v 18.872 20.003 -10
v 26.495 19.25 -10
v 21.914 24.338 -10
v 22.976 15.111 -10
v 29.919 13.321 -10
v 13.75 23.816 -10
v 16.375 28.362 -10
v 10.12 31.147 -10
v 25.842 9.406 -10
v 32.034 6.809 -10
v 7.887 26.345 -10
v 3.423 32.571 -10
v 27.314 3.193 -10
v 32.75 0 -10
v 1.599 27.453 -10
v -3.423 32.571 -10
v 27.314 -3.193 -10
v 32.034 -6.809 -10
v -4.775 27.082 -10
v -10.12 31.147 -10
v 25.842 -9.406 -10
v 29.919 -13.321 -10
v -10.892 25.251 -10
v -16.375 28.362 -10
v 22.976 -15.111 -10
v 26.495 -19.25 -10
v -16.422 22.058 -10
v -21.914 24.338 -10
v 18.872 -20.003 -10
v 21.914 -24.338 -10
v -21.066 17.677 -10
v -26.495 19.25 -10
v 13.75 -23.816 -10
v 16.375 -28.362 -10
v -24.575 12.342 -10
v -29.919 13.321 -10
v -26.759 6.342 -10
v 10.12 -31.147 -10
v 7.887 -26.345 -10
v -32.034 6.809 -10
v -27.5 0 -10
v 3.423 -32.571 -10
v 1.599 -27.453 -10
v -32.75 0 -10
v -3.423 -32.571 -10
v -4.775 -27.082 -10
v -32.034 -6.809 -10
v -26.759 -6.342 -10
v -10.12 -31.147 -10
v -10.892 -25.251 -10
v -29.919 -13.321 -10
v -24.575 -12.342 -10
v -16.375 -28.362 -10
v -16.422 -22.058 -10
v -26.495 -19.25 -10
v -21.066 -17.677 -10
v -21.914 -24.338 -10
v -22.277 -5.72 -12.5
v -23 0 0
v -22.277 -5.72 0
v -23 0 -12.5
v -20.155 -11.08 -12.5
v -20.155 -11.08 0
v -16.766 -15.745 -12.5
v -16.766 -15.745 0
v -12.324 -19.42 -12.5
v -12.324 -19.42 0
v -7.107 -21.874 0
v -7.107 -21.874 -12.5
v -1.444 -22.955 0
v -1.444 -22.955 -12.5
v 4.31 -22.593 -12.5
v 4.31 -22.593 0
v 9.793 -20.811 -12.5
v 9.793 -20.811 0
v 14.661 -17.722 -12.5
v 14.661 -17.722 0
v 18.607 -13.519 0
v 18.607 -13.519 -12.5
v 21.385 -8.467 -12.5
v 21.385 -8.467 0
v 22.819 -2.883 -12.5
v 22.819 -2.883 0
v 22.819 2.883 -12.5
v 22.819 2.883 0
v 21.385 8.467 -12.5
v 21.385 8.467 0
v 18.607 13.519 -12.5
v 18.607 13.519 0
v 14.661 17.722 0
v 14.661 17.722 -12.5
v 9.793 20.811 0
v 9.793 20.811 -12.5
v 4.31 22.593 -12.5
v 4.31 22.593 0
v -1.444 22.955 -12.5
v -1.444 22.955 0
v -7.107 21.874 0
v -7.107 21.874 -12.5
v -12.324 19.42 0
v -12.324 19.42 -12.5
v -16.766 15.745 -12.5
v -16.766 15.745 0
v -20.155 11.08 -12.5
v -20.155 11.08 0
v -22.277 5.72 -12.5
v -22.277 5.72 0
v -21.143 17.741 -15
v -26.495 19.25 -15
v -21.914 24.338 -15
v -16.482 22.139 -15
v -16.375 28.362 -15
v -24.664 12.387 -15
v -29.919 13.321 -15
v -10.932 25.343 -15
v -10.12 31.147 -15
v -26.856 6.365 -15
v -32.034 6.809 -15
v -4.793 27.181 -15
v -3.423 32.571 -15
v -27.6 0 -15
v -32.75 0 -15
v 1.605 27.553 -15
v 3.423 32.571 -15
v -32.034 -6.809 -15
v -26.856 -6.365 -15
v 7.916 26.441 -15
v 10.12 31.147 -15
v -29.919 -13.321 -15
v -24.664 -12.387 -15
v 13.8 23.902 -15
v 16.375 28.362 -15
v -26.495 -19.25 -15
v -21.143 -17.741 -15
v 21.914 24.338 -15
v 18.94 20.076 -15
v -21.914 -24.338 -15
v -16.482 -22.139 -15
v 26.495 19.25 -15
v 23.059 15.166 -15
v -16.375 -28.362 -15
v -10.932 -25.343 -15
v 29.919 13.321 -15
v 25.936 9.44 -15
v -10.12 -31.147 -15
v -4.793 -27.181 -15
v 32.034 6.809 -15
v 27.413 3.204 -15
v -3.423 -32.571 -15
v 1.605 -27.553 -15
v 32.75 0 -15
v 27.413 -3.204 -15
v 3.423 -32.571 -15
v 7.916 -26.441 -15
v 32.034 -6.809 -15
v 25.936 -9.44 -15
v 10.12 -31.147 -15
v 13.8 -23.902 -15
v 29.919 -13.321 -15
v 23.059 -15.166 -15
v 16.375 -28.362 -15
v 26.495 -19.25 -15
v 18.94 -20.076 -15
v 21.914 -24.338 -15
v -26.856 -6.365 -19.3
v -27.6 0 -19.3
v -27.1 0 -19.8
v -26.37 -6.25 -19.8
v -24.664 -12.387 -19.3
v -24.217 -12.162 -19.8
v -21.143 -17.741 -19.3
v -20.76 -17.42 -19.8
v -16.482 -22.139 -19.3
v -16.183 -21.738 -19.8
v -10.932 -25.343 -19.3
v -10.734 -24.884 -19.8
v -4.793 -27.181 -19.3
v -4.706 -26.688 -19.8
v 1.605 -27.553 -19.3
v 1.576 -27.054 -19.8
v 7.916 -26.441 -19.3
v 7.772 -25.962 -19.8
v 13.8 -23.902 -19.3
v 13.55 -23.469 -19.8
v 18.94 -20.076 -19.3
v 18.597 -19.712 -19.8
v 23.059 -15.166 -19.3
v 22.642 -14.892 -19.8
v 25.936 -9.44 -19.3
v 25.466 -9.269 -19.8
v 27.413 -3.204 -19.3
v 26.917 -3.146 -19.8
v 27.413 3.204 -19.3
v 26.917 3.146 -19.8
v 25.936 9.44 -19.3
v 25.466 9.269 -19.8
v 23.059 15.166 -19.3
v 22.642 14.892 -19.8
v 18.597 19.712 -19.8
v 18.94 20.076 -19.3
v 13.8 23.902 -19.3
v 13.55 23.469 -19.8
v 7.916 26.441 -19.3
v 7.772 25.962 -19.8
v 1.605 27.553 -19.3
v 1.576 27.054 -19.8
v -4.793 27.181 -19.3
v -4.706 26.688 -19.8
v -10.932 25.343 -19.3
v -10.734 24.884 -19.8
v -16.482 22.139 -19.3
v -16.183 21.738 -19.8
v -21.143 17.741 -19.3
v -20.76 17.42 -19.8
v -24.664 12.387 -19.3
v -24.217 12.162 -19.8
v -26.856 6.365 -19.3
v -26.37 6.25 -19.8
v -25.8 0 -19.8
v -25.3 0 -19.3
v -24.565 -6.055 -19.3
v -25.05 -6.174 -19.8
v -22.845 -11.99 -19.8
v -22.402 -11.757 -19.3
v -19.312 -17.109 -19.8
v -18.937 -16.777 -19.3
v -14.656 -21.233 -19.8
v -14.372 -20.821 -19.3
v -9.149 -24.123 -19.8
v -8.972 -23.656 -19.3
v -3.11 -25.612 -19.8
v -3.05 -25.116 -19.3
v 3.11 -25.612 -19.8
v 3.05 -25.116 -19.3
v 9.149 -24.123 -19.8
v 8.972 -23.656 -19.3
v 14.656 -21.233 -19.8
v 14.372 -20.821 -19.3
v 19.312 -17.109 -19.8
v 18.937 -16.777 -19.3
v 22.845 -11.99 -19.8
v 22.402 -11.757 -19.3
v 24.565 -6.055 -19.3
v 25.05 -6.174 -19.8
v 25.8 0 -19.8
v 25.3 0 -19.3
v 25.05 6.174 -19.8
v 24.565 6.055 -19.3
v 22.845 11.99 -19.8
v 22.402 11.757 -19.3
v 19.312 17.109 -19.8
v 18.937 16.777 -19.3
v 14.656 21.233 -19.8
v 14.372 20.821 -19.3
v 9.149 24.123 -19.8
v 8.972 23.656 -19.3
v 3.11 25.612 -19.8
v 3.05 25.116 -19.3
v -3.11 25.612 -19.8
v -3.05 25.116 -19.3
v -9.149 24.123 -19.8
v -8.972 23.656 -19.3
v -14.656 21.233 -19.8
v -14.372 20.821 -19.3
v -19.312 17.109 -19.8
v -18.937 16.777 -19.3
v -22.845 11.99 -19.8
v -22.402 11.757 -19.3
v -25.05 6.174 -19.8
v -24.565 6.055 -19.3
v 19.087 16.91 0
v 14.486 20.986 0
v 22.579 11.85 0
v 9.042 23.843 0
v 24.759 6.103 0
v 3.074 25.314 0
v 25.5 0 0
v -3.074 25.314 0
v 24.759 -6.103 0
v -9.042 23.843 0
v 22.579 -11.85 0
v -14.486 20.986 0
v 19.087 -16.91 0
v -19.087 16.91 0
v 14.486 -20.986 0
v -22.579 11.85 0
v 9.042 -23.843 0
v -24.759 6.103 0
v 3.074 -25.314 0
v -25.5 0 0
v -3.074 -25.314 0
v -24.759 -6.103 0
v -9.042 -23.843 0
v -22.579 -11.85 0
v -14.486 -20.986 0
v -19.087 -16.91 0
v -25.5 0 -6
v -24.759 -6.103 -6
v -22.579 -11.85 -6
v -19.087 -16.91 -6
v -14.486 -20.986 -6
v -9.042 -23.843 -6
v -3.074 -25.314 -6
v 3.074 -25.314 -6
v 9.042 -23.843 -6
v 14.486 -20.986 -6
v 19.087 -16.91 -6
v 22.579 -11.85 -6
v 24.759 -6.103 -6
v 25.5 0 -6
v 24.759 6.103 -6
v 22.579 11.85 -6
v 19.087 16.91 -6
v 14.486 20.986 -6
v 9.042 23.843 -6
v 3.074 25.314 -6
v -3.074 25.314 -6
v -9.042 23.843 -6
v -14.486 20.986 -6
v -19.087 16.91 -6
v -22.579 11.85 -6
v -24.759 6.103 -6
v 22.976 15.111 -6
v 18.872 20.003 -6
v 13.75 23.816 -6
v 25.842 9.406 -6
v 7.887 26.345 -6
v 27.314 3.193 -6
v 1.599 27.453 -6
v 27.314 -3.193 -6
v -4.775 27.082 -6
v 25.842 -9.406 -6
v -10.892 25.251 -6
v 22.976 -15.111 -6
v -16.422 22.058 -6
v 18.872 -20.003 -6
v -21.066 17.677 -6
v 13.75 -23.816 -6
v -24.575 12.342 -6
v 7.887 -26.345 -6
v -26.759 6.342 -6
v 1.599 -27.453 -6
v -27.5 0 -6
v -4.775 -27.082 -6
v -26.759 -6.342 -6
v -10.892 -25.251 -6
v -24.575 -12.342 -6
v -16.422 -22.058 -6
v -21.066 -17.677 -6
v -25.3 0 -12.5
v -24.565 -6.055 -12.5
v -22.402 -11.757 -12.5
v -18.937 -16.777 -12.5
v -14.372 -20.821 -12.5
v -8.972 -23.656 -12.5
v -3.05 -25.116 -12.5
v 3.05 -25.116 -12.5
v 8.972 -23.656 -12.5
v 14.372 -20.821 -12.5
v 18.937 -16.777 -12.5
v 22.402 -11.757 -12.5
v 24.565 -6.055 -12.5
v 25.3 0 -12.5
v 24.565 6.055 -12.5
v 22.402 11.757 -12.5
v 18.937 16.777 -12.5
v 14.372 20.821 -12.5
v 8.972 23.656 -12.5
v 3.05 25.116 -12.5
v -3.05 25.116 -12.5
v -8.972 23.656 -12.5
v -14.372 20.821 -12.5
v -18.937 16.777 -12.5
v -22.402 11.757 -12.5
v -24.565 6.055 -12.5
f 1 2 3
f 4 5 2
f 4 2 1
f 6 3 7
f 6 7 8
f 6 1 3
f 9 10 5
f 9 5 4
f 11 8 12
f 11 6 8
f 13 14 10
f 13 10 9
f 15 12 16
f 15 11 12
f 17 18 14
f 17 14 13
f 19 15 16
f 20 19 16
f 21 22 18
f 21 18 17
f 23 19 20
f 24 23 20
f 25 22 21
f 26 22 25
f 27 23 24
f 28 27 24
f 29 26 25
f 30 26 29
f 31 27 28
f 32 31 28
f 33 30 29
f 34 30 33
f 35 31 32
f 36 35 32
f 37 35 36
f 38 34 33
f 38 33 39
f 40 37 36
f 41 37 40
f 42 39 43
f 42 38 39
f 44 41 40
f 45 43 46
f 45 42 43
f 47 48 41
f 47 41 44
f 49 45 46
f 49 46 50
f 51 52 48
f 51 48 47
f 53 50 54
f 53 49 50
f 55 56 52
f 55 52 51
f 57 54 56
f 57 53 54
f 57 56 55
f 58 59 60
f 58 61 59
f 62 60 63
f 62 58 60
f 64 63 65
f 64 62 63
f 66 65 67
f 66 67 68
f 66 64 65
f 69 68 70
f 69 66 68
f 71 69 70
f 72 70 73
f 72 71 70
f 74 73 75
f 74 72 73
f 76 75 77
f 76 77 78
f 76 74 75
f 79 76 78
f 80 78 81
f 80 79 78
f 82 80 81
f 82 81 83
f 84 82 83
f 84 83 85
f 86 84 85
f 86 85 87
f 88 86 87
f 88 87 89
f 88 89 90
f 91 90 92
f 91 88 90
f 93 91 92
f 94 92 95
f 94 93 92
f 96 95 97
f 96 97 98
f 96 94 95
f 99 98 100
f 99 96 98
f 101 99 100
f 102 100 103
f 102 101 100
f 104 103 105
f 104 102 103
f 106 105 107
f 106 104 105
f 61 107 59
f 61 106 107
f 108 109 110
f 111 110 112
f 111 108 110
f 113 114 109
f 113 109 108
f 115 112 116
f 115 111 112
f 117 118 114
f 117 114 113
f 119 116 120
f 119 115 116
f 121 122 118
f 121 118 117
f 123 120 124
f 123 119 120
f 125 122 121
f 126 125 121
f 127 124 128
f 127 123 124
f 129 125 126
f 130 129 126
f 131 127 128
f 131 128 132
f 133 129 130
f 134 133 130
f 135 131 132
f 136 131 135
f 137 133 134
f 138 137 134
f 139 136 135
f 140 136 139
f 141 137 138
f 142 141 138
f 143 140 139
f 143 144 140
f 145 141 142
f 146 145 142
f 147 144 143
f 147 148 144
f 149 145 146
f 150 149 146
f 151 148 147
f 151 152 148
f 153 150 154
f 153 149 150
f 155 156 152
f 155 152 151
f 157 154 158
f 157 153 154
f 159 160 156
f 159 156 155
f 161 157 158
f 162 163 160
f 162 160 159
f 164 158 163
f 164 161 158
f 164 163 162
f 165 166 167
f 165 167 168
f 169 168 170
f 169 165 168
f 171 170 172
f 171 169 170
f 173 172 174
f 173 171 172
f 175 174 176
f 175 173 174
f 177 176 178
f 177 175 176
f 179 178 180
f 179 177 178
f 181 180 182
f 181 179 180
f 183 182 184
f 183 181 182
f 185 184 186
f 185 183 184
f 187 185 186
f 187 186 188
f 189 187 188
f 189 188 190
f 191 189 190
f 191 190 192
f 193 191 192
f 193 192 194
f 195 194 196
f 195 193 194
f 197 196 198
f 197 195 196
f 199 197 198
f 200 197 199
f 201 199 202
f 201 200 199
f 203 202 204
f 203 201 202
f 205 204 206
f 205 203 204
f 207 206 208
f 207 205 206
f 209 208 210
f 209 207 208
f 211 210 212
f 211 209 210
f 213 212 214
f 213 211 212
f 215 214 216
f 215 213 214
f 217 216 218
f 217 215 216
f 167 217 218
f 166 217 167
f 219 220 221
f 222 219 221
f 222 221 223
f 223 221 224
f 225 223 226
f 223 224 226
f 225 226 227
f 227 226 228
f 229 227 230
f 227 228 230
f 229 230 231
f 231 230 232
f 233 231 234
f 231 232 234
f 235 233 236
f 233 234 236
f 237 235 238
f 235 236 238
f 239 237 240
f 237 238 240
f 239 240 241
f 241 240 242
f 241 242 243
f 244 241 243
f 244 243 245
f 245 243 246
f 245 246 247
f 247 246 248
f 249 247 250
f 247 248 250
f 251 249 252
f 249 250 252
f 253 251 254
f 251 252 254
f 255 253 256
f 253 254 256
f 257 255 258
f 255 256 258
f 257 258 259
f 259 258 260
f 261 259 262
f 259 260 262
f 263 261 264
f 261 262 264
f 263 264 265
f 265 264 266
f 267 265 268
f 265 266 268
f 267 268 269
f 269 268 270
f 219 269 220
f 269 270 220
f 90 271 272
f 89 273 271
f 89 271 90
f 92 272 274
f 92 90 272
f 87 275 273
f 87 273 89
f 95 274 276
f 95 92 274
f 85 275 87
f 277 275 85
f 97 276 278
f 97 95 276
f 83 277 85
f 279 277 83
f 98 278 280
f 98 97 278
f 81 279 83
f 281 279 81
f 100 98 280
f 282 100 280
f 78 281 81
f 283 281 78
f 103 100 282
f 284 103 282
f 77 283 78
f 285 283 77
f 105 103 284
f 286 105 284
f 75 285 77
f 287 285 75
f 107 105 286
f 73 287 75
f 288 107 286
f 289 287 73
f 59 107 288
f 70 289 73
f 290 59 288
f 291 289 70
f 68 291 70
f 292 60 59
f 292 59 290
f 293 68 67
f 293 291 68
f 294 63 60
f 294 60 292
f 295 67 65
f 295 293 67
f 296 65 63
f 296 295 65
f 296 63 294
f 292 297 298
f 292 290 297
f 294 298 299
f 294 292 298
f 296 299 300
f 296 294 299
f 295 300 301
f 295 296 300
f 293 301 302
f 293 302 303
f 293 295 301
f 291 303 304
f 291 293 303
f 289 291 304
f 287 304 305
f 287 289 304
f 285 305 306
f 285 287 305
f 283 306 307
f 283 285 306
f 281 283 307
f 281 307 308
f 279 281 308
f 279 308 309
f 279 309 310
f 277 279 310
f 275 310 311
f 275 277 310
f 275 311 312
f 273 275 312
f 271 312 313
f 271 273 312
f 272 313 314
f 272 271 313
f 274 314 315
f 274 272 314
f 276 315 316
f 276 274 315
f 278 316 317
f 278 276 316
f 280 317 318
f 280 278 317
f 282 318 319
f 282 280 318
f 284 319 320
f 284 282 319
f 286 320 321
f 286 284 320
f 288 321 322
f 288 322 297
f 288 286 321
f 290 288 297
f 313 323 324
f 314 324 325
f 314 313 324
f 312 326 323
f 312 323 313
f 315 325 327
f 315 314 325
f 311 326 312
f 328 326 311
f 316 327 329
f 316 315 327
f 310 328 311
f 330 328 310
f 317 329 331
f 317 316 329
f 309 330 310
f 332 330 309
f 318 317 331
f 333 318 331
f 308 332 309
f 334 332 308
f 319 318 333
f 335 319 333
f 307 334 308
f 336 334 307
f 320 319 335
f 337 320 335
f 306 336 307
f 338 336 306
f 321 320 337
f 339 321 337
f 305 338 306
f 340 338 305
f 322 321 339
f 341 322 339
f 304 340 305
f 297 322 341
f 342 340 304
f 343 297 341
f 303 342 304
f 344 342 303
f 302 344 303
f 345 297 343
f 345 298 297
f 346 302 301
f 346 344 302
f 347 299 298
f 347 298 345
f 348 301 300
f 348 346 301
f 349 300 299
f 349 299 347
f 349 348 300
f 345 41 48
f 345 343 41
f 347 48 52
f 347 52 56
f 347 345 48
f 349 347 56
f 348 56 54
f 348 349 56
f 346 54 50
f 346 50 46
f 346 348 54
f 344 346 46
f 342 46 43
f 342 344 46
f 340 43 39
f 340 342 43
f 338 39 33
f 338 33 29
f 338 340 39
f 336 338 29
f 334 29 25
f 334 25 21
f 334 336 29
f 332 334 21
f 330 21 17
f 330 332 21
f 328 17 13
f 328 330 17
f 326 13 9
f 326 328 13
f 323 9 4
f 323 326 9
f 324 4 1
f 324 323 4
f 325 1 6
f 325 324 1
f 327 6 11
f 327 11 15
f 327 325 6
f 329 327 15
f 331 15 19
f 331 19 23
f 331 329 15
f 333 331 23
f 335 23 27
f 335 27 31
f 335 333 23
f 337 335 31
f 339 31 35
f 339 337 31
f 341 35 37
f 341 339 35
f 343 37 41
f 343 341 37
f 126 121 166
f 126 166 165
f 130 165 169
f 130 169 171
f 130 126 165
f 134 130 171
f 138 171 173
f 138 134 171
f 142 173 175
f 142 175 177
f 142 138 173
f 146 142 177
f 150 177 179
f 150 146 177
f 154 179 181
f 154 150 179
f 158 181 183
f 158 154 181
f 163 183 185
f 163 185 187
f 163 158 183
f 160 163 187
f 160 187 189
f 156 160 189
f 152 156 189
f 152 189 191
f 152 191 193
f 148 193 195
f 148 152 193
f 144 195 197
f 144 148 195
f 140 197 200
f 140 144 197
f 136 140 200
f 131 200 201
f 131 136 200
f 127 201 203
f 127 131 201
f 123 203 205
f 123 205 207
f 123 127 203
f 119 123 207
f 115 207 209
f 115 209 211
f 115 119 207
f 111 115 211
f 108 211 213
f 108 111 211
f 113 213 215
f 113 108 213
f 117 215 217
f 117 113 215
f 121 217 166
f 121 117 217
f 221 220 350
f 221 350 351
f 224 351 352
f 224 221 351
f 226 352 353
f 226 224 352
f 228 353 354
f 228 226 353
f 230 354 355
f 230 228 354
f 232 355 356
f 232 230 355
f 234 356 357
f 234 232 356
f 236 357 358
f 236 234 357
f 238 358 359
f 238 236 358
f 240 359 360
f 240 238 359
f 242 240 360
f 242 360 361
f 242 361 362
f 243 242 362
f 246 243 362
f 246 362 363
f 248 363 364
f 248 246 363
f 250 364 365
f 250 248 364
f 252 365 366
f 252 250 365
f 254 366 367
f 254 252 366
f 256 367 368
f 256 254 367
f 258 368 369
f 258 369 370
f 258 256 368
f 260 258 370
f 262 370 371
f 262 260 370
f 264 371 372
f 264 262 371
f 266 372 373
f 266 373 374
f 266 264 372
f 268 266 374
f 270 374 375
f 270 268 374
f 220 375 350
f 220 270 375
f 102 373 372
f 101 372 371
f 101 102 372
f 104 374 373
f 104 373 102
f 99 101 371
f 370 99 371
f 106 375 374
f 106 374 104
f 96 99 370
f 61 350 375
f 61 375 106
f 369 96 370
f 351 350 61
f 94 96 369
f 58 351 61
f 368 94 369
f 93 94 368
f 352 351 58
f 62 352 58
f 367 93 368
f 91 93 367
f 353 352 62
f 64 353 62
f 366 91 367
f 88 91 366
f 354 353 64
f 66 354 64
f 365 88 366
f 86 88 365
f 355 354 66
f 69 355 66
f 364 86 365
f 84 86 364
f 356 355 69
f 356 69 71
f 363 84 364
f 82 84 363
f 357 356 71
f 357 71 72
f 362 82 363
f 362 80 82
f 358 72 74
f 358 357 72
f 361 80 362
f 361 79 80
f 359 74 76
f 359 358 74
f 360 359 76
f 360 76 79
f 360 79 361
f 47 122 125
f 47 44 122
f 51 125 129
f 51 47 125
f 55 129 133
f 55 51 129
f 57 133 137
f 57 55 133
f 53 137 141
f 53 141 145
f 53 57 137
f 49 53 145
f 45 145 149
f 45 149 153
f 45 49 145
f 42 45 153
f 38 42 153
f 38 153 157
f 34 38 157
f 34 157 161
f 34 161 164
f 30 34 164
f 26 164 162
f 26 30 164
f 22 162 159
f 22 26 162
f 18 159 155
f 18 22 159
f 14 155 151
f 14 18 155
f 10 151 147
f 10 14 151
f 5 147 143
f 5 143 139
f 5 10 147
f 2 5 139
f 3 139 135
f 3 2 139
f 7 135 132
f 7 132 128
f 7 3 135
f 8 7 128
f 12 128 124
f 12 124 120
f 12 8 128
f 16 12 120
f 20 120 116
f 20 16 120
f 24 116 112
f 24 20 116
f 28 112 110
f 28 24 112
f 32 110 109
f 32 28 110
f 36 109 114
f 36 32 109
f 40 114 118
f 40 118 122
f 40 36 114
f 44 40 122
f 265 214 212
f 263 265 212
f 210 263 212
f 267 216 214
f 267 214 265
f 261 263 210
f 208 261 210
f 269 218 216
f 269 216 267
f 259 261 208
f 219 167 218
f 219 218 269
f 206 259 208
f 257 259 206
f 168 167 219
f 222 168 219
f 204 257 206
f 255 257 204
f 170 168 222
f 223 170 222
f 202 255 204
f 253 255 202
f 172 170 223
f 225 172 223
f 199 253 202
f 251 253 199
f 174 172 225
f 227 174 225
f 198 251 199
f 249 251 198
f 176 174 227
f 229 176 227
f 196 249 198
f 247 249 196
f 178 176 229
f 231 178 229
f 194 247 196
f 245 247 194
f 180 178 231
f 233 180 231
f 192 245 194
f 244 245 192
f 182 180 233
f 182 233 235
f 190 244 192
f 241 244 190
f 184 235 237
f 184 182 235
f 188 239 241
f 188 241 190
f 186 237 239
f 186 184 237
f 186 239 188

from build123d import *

# Parameters (mm, degrees)
CHAMFER1_SIZE = 0.5


with BuildPart() as part:
    # Sketch1 → Revolve1 (revolve)
    with BuildSketch(Plane(origin=(0, 0, 0), x_dir=(1, 0, 0), z_dir=(0, 1, 0)), mode=Mode.PRIVATE) as revolve1_sk:
        Polygon((25.3, 19.8), (27.6, 19.8), (27.6, 15), (32.75, 15), (32.75, 10), (27.5, 10), (27.5, 6), (25.5, 6), (25.5, 0), (23, 0), (23, 12.5), (25.3, 12.5), align=None)
    revolve(revolve1_sk.sketch.rotate(Axis((0, 0, -99.297916667), (0, 0, 1)), 180), axis=Axis((0, 0, -99.297916667), (0, 0, 1)))

    # Chamfer1
    chamfer1_edges = [part.edges().sort_by_distance(p)[0] for p in [
        (27.6, 0, -19.8),
        (25.3, 0, -19.8),
    ]]
    chamfer(chamfer1_edges, length=CHAMFER1_SIZE)


solid = part.part
